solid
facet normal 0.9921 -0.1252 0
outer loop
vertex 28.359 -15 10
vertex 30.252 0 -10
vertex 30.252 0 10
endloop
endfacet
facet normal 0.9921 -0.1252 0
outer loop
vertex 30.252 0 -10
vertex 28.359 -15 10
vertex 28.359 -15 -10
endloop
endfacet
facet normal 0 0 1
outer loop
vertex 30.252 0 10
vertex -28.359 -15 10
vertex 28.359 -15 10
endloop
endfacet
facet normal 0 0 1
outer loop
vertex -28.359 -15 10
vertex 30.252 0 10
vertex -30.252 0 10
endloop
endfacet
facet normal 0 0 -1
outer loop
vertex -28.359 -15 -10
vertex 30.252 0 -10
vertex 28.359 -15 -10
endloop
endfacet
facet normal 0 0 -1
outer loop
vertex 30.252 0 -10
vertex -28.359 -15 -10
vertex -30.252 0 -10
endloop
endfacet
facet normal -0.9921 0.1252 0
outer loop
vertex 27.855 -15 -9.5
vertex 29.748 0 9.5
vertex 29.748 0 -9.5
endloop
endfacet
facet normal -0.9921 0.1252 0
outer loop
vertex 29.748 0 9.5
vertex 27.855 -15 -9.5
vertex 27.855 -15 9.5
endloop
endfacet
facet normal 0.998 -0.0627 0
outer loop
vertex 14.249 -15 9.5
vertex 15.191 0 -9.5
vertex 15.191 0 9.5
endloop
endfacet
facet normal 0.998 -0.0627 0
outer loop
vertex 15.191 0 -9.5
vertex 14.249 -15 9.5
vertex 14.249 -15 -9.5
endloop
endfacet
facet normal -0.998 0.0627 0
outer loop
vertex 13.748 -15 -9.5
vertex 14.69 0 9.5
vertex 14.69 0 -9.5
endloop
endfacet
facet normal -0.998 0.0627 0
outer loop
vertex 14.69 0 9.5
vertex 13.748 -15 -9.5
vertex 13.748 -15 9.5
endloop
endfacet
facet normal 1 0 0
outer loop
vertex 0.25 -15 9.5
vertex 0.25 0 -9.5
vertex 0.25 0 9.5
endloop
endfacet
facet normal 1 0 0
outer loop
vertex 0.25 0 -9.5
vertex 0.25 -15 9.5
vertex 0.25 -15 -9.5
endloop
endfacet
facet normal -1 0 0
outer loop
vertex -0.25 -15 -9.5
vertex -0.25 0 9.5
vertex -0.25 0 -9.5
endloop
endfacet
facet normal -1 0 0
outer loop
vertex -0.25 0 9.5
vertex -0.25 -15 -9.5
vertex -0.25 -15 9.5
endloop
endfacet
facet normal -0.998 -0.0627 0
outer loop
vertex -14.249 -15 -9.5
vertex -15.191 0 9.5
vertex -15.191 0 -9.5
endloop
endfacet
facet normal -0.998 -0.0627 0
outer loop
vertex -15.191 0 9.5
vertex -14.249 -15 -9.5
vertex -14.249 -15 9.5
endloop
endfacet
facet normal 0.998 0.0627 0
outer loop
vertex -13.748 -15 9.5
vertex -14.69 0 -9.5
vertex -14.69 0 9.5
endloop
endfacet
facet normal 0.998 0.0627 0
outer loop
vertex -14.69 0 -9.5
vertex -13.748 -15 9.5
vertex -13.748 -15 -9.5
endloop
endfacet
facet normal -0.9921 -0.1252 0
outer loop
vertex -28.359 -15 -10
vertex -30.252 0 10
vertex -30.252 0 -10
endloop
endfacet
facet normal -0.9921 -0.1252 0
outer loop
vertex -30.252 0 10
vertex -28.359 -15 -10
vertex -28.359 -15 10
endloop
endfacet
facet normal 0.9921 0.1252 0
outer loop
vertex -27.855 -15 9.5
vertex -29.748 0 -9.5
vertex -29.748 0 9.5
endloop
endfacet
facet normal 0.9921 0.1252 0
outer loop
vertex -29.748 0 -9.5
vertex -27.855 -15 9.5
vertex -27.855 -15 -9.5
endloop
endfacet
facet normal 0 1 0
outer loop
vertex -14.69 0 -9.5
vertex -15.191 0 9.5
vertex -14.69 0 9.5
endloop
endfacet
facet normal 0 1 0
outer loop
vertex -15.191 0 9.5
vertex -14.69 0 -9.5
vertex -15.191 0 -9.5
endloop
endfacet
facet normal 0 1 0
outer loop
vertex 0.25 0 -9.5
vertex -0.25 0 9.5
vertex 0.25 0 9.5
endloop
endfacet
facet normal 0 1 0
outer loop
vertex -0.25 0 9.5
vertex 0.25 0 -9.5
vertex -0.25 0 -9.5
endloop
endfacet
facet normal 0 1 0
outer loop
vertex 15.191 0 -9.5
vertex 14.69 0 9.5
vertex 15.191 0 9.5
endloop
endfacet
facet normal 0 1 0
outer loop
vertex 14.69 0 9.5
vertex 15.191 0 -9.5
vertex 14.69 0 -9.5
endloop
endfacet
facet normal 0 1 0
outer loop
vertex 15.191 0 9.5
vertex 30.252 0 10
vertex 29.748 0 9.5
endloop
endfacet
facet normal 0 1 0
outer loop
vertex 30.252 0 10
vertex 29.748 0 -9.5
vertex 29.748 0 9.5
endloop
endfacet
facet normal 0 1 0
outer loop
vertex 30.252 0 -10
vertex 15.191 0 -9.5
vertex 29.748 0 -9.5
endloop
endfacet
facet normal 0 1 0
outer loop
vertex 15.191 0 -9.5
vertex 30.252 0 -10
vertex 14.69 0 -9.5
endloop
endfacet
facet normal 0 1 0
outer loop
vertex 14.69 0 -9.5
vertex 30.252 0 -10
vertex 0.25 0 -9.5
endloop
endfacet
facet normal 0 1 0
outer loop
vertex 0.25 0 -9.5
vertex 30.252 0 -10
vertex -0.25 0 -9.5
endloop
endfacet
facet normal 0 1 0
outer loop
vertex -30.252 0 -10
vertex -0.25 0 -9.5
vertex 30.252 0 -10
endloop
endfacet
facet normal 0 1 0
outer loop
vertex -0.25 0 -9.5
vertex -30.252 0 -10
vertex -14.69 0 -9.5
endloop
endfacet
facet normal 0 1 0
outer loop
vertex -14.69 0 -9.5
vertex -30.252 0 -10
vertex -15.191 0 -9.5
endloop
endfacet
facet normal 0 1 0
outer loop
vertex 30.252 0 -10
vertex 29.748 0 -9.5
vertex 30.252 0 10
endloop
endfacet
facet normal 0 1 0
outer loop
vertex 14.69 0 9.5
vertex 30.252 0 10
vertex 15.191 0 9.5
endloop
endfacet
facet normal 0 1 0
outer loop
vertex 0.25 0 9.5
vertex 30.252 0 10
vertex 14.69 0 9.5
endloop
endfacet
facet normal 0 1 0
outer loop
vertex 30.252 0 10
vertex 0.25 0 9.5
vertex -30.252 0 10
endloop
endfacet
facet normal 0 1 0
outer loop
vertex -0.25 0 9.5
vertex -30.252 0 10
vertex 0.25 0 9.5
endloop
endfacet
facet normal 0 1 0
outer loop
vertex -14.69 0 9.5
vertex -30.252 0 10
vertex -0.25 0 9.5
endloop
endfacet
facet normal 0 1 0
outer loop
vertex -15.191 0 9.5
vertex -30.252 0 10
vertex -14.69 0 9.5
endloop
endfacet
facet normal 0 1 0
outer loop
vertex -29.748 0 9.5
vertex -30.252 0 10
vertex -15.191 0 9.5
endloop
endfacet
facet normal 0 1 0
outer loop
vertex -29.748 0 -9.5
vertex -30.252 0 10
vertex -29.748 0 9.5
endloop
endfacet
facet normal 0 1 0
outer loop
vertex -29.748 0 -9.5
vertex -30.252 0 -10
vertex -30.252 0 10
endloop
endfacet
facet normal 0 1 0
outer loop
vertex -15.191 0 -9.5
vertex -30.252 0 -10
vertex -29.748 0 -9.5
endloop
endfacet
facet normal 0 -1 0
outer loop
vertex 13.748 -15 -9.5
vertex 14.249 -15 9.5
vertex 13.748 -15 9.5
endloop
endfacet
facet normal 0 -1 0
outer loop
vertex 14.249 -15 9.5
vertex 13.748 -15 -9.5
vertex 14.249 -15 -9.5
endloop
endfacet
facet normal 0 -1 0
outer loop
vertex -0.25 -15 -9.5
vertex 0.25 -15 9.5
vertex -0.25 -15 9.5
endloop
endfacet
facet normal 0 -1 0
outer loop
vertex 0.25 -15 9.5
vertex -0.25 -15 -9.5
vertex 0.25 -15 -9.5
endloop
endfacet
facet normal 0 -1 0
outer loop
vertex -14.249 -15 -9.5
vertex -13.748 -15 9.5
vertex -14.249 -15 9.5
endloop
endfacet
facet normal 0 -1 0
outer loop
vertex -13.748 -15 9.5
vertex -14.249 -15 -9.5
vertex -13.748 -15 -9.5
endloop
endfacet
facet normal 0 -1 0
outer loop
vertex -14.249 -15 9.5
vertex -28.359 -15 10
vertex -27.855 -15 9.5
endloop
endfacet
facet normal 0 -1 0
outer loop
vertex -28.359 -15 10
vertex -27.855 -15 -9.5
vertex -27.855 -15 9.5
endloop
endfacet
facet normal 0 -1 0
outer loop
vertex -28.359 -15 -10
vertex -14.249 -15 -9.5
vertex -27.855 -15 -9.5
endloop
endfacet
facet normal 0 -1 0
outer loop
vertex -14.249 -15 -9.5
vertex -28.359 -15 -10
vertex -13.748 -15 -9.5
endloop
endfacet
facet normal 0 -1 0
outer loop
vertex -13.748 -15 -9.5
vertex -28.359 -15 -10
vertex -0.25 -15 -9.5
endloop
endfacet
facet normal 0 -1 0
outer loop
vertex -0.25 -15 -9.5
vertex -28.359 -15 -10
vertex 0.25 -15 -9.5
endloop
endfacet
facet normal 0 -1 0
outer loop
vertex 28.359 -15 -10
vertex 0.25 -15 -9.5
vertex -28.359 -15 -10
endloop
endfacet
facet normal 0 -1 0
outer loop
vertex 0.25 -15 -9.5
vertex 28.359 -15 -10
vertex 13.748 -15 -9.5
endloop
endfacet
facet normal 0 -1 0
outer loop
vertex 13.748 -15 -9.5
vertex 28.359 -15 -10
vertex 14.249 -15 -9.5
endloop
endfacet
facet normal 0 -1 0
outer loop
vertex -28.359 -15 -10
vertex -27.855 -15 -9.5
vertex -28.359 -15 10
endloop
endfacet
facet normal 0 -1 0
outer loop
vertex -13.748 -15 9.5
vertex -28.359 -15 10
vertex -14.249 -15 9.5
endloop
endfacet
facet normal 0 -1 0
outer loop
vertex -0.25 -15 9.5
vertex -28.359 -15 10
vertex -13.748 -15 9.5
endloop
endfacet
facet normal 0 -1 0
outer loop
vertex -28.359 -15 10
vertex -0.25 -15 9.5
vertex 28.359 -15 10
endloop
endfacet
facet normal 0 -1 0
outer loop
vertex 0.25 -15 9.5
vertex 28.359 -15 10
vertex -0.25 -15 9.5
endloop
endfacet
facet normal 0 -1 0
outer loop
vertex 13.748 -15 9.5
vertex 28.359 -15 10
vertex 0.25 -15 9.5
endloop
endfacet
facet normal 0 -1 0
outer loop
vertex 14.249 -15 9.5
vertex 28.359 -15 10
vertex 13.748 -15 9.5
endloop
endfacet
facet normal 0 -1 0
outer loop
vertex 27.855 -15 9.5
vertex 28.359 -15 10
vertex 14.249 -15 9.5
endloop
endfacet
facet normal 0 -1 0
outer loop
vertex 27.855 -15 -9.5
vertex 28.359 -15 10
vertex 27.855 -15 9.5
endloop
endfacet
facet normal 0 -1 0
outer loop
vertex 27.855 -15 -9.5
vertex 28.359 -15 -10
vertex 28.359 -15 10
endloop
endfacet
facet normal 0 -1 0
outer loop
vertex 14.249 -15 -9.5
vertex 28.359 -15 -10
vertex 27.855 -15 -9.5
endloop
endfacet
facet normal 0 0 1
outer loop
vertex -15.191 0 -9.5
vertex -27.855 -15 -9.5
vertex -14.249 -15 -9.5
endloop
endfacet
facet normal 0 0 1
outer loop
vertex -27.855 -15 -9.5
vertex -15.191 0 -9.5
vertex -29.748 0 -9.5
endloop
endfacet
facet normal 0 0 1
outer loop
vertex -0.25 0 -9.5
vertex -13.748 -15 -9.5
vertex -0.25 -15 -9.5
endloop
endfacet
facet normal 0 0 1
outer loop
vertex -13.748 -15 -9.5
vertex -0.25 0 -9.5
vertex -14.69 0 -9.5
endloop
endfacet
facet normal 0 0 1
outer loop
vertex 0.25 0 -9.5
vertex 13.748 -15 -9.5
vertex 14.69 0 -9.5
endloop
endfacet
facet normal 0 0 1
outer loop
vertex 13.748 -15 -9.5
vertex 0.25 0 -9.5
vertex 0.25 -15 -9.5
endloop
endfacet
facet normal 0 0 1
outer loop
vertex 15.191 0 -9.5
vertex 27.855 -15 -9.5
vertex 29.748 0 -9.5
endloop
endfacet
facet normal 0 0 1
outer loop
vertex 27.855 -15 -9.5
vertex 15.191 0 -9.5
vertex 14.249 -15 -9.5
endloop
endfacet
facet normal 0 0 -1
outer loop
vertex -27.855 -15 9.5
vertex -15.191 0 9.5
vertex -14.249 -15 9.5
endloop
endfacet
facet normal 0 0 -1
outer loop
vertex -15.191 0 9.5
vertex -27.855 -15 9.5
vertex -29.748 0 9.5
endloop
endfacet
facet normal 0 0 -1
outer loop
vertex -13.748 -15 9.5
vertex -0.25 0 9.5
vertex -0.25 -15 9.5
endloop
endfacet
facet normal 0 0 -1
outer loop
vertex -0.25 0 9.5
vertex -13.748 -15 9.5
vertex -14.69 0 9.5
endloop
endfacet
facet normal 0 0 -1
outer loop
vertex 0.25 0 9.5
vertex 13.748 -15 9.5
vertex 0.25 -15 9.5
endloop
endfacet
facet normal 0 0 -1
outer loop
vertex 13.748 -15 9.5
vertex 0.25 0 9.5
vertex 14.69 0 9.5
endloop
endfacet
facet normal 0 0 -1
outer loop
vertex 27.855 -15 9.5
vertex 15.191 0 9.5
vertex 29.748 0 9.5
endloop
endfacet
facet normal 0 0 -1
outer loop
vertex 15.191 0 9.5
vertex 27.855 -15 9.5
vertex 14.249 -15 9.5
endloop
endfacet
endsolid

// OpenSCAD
diagonal = 27;
resolution = [1920, 1080];
fov = 103; //[40:120]


number_of_slats=5;
w=60;
d=15;
h=20;
twt=.5;

module __Customizer_Limit__() {}
/*
version 0: place in center of screen
*/

display_depth=1;

inch = 25.4;

diagonal_resolution = sqrt(resolution.x^2 + resolution.y^2);

display_width = diagonal * inch * resolution.x / diagonal_resolution;
display_height = diagonal * inch * resolution.y / diagonal_resolution;
display_distance = display_width/2 * 1/tan(fov/2);

module mirror2(xyz){
  children();
  mirror(xyz) children();
}

module sanity_check(){
  cube([display_width, display_depth, display_height], center=true);
  color("red") rotate([90,0,0]) cylinder(h=.2, d=diagonal*inch, center=true);
}

module context(){
  cube([display_width, display_depth, display_height], center=true);
  cube([w,d,h], center=true);
  mirror2([1,0,0]){
    translate([32,-display_distance,0]) sphere(d=inch);
    translate([0,-display_distance,0])
      rotate([0,0,-fov/2])
      cube([1, display_distance*2,10]);
  }
}


module slats(){
  half_angle = atan2(w/2, display_distance);
  intersection(){
    translate([0,-d/2,0]) cube([999,d,999], center=true);
    for(i=[0:number_of_slats-1]){
      t=i/(number_of_slats-1);
      theta=-half_angle + 2*half_angle*t;
      translate([0,-display_distance,0])
        rotate([0,0,theta])
        translate([-twt/2,0,-h/2])
        cube([twt, display_distance*2,h]);
    }
  }
}

module main(){
  slats();
  
  mirror2([0,0,1])
    translate([0,0,-h/2])
    linear_extrude(twt)
    hull()
    projection()
    slats();
  
}

//%context();
main();
